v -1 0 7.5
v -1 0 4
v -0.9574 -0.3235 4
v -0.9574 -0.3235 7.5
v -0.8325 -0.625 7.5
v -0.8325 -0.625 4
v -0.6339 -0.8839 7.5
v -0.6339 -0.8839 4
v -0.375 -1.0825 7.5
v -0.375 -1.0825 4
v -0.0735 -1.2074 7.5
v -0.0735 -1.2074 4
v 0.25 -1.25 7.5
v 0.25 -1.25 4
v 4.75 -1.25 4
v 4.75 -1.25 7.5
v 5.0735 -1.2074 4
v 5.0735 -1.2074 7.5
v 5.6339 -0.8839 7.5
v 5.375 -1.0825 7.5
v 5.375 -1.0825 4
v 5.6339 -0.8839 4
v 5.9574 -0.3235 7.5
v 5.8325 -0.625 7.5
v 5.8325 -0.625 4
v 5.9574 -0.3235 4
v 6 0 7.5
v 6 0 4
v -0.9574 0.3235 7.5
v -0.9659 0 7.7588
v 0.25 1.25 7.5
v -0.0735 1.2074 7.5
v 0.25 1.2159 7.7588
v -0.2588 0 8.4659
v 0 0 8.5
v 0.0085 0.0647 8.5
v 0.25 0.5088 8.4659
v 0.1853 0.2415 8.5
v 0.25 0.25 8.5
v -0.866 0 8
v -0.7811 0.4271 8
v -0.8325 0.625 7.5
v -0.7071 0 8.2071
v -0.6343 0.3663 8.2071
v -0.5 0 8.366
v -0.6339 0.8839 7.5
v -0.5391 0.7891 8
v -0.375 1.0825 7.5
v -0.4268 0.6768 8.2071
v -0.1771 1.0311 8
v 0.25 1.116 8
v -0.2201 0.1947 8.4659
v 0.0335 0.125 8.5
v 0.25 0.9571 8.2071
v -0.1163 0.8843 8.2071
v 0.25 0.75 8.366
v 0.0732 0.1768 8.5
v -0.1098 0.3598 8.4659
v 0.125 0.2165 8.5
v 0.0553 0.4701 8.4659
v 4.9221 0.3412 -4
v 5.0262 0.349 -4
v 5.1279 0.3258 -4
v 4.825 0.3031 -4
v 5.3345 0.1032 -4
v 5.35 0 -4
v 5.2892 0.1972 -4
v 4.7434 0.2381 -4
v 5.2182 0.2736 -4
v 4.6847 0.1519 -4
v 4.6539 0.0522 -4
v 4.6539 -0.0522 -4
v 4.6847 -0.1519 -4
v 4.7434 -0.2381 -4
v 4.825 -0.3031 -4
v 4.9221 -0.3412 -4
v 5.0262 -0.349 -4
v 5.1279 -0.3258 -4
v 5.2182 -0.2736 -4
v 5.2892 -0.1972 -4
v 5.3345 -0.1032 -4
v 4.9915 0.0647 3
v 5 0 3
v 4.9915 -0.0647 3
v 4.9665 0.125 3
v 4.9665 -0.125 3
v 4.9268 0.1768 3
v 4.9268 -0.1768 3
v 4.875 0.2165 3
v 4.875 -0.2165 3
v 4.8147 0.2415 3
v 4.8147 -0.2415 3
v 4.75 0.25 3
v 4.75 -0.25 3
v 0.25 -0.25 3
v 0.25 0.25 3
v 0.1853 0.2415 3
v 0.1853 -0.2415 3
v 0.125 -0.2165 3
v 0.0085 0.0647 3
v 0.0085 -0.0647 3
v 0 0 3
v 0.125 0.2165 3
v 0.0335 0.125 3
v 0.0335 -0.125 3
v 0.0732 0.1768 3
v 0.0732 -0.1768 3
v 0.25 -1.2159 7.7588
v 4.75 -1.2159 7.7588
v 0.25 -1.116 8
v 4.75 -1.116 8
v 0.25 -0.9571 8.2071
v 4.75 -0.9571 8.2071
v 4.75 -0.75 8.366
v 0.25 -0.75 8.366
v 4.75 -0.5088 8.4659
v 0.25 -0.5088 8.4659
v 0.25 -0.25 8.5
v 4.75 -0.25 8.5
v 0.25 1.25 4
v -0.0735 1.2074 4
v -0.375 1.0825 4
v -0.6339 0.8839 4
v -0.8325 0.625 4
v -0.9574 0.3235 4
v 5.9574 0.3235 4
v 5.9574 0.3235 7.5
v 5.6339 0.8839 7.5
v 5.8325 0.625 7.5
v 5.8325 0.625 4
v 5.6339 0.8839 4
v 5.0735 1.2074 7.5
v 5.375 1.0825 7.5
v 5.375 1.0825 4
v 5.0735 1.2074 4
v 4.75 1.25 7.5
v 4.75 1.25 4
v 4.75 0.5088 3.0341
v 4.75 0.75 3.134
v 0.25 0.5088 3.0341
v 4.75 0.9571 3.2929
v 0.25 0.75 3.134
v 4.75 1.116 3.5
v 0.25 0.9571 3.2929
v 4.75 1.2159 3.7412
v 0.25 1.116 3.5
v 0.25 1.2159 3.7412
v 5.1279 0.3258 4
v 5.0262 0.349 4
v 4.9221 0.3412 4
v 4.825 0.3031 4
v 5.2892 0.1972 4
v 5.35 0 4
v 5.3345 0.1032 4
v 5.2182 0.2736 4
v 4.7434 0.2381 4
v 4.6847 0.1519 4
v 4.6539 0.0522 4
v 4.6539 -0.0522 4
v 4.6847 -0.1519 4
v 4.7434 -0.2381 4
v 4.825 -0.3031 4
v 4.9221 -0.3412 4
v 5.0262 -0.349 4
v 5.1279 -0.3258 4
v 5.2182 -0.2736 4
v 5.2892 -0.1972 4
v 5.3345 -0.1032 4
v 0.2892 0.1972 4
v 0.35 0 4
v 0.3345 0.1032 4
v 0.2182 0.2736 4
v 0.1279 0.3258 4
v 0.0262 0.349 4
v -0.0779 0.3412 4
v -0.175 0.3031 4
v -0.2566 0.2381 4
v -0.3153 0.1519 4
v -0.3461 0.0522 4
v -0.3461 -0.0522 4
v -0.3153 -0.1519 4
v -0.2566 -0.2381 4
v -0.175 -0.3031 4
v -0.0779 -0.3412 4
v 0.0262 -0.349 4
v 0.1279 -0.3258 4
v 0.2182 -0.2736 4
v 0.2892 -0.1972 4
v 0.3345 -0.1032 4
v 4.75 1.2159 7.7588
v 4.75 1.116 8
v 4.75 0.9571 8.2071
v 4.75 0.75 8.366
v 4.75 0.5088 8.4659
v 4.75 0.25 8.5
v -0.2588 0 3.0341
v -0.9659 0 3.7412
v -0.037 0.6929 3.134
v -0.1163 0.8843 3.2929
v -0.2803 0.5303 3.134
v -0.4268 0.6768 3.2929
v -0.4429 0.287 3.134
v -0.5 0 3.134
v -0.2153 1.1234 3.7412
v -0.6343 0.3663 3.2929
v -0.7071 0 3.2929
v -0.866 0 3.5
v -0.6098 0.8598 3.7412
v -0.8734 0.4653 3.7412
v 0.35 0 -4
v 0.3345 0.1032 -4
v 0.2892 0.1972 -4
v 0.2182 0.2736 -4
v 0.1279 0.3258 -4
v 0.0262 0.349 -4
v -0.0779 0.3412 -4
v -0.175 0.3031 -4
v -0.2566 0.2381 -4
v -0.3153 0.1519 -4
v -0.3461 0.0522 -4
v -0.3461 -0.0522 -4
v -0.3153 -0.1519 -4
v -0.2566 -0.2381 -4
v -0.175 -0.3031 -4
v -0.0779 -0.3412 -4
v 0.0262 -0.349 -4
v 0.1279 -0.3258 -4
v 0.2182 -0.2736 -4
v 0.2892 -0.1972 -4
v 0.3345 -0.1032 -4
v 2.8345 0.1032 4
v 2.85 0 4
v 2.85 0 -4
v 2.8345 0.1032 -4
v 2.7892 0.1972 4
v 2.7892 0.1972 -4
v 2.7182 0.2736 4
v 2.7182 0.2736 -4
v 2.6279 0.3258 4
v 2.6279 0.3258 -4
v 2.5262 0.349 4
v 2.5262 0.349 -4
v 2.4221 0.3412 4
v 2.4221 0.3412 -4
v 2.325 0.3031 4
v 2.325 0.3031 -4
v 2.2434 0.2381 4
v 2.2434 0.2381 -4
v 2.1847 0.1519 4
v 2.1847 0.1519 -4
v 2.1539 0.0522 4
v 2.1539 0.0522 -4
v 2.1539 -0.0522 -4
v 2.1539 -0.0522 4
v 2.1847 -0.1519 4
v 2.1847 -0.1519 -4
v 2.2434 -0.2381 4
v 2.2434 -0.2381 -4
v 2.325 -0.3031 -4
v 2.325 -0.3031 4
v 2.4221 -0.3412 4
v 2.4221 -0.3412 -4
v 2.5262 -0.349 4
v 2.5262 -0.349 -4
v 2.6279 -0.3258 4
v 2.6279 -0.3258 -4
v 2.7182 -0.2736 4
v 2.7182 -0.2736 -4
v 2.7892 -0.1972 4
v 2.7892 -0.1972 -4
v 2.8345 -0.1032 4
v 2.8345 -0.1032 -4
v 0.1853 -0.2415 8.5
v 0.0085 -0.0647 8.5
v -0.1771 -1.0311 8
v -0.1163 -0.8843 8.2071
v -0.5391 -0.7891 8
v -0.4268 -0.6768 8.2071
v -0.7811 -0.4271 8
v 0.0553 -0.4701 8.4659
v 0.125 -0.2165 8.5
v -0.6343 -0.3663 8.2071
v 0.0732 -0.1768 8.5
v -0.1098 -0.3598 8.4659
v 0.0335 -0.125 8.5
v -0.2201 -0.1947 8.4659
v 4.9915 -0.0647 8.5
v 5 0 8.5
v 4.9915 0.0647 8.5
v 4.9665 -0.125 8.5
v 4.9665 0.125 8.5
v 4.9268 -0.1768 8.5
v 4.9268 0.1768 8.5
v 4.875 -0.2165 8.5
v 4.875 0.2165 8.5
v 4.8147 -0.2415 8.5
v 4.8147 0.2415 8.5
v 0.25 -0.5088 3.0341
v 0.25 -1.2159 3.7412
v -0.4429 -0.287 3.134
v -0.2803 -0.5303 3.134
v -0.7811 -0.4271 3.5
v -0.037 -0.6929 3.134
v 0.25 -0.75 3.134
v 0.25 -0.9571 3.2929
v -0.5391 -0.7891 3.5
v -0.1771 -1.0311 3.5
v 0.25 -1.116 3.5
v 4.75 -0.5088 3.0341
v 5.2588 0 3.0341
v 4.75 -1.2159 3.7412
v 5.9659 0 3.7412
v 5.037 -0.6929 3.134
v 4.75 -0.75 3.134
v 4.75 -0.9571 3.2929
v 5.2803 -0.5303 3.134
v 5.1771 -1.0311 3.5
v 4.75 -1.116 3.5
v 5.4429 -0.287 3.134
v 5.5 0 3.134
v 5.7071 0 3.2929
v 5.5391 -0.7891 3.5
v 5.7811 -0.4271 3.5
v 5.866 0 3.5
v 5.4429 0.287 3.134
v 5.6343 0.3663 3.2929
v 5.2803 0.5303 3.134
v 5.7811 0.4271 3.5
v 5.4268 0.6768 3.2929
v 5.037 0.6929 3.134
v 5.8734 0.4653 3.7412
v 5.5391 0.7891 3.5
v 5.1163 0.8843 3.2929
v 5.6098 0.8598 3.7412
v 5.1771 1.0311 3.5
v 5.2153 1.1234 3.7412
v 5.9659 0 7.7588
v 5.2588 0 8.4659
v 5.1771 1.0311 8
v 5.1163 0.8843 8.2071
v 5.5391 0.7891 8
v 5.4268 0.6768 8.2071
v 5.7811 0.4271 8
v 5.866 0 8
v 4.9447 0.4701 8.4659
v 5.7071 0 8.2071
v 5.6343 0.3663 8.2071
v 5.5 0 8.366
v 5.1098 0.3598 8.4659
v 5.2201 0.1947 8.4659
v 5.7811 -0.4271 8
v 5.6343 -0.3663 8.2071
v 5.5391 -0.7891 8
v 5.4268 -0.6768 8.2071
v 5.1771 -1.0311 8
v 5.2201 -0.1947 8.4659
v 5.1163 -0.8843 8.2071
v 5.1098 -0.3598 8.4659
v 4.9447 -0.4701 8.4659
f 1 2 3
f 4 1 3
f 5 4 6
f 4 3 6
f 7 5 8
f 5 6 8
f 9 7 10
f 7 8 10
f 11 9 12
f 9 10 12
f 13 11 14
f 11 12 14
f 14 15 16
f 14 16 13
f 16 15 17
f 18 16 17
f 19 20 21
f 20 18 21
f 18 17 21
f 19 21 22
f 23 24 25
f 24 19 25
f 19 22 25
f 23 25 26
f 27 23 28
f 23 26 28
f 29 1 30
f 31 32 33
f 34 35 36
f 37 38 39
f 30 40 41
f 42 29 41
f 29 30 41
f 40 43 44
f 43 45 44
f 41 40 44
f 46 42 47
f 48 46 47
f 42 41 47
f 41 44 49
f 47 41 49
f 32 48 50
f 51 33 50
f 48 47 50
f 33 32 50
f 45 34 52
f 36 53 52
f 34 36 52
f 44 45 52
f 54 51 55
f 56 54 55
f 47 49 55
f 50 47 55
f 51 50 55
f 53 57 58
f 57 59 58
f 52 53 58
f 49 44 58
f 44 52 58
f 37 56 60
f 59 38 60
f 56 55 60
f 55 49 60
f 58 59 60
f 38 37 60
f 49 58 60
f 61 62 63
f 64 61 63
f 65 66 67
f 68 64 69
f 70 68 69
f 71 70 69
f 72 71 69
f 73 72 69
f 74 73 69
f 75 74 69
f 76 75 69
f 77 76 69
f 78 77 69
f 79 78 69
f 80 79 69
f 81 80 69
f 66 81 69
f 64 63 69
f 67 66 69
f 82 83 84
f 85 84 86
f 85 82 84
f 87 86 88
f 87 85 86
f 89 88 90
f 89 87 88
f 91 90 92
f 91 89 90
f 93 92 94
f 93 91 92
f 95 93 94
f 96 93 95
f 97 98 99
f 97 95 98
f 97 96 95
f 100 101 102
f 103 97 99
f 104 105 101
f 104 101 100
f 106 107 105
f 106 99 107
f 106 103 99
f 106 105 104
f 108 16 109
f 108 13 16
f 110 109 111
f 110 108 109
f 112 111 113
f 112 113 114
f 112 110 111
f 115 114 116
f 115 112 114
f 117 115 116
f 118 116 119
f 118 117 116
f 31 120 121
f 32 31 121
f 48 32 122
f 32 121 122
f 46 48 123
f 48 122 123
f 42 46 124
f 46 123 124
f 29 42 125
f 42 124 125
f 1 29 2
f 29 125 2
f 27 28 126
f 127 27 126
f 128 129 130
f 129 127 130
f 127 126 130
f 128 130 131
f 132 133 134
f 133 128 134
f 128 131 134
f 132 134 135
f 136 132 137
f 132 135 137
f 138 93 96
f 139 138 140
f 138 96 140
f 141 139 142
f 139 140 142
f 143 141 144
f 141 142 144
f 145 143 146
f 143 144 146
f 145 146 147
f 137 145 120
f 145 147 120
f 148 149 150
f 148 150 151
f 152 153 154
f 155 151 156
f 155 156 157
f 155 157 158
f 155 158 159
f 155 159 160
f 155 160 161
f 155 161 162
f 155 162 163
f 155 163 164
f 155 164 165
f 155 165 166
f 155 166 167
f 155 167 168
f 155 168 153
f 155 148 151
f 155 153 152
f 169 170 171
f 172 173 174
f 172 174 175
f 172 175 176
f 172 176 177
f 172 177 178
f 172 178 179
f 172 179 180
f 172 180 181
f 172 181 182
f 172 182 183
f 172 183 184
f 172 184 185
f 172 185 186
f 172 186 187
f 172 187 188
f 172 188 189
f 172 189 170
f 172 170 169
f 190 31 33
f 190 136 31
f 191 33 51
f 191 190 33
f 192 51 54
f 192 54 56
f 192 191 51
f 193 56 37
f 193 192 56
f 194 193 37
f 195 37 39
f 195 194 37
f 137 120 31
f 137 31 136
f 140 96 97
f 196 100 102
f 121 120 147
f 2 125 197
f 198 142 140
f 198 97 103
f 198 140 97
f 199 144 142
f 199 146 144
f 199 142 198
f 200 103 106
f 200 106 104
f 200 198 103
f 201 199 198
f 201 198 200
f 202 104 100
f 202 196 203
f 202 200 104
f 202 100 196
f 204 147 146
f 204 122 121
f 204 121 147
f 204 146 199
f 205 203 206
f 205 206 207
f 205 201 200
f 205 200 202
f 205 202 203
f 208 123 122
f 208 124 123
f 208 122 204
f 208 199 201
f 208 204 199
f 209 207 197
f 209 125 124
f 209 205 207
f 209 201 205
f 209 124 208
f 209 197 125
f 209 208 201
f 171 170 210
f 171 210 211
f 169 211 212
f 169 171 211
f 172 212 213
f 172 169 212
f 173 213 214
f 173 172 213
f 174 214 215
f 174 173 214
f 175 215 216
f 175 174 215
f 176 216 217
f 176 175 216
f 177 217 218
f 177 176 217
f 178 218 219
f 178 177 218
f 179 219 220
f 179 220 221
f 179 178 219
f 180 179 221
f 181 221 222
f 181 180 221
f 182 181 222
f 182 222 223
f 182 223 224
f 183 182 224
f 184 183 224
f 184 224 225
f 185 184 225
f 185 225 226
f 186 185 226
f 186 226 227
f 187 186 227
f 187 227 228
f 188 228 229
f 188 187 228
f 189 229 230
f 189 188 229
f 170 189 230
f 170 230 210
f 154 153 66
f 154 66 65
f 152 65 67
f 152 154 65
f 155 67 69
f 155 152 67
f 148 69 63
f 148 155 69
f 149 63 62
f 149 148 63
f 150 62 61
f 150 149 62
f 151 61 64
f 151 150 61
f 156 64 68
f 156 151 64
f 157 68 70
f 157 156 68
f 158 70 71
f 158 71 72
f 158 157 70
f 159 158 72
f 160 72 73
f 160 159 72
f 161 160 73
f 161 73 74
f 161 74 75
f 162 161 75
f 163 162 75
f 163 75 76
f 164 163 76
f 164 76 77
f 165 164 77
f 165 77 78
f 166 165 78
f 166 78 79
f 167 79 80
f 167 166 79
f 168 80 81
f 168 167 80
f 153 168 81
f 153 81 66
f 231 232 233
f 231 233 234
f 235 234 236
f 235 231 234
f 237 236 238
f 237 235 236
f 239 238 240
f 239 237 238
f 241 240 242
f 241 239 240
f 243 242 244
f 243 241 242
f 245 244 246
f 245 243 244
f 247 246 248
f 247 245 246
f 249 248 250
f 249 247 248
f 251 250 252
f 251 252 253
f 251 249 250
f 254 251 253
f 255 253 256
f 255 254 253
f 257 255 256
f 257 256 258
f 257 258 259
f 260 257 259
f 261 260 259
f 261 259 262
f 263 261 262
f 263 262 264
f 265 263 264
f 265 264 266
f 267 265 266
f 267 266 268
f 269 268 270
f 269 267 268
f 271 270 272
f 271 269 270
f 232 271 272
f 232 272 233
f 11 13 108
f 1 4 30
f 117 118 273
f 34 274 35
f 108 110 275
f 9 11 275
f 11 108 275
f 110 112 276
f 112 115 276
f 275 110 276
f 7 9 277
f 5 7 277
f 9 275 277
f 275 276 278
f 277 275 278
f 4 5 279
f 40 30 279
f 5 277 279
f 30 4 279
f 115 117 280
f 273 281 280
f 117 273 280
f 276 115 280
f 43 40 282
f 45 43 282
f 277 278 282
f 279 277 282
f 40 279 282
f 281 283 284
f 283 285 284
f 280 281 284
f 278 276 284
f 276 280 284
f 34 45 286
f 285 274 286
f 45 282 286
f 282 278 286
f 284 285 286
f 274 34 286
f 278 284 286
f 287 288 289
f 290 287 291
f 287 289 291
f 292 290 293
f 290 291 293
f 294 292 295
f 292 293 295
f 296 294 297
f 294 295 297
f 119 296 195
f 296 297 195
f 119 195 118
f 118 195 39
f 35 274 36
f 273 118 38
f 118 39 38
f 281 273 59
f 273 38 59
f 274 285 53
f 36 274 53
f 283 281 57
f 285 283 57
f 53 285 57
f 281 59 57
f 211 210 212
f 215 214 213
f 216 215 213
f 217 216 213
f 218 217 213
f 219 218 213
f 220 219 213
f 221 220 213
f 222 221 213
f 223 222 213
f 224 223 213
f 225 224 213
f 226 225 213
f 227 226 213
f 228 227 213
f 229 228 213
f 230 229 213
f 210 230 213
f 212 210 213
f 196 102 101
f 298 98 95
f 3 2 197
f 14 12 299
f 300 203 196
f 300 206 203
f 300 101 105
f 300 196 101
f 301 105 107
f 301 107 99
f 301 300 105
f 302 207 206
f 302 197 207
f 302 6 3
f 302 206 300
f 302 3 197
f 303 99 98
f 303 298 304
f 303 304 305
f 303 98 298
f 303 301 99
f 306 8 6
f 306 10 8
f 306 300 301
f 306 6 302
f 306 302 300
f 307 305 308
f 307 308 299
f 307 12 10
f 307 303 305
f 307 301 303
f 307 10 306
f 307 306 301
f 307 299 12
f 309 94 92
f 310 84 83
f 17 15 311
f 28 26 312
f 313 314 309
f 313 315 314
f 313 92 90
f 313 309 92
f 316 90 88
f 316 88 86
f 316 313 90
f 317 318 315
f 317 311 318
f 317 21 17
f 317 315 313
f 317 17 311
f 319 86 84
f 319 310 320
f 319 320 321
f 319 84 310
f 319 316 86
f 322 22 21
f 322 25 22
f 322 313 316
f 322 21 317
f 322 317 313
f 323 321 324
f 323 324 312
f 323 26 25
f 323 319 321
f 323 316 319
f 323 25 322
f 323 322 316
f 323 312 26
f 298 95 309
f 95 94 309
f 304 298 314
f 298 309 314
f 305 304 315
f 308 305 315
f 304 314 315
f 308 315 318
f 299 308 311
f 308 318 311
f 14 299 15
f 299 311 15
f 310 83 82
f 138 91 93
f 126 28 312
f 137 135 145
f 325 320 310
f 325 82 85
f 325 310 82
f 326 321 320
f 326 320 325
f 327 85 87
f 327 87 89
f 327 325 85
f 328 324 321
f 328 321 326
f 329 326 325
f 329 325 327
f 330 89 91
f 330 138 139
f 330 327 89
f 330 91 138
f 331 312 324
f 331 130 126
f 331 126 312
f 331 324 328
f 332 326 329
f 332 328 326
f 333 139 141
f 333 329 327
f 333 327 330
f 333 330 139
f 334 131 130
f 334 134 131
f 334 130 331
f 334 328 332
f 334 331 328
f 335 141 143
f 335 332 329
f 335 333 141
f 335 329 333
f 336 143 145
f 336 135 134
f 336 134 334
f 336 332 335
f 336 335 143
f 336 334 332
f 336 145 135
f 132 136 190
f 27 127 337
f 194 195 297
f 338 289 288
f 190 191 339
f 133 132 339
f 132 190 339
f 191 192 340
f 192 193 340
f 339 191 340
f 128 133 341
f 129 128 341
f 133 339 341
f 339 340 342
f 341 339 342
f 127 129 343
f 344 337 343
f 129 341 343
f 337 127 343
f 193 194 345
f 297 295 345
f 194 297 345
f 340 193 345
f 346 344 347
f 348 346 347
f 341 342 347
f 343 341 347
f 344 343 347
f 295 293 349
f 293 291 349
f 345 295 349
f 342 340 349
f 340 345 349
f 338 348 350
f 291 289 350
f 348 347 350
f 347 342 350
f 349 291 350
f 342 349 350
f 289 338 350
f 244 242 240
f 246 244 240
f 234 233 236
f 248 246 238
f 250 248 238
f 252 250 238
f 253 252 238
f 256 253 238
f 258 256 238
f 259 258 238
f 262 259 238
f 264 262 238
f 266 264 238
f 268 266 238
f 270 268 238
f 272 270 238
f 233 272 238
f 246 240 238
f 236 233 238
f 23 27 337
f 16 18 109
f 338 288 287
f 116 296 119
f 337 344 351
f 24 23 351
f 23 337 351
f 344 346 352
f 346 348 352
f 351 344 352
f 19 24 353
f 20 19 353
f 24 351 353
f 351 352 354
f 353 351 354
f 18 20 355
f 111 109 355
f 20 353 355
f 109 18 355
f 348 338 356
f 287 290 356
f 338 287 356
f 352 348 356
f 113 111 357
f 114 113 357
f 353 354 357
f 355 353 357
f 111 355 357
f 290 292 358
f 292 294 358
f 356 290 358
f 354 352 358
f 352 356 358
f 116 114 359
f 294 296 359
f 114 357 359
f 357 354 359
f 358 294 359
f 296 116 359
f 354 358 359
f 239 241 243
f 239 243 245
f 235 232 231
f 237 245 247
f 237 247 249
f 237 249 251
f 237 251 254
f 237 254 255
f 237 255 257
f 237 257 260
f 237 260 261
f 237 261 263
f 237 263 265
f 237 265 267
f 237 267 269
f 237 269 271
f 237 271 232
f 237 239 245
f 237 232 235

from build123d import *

# Parameters (mm, degrees)
SKETCH_R     = 0.35
PAD_DEPTH    = 8
PAD002_DEPTH = 5.5
FILLET_R     = 1
FILLET001_R  = 1


with BuildPart() as pad:
    # Sketch → Pad (new body)
    with BuildSketch(Plane.XY.offset(4)):
        Circle(SKETCH_R)
        with Locations((5, 0)):
            Circle(SKETCH_R)
        with Locations((2.5, 0)):
            Circle(SKETCH_R)
    extrude(amount=-PAD_DEPTH)


with BuildPart() as fillet001:
    # Sketch003 → Pad002 (new body)
    with BuildSketch(Plane.XY.offset(3)):
        with BuildLine():
            Line((0.25, 1.25), (4.75, 1.25))
            ThreePointArc((6, 0), (5.633883, 0.883883), (4.75, 1.25))
            ThreePointArc((4.75, -1.25), (5.633883, -0.883883), (6, 0))
            Line((4.75, -1.25), (0.25, -1.25))
            ThreePointArc((-1, 0), (-0.633883, -0.883883), (0.25, -1.25))
            ThreePointArc((0.25, 1.25), (-0.633883, 0.883883), (-1, 0))
        make_face()
    extrude(amount=PAD002_DEPTH)

    # Fillet
    fillet_edges = [fillet001.edges().sort_by_distance(p)[0] for p in [
        (2.5, 1.25, 8.5),
        (-0.633883, 0.883883, 8.5),
        (-0.633883, -0.883883, 8.5),
        (2.5, -1.25, 8.5),
        (5.633883, -0.883883, 8.5),
        (5.633883, 0.883883, 8.5),
    ]]
    fillet(fillet_edges, radius=FILLET_R)

    # Fillet001
    fillet001_edges = [fillet001.edges().sort_by_distance(p)[0] for p in [
        (5.633883, -0.883883, 3),
        (5.633883, 0.883883, 3),
        (2.5, 1.25, 3),
        (2.5, -1.25, 3),
        (-0.633883, -0.883883, 3),
        (-0.633883, 0.883883, 3),
    ]]
    fillet(fillet001_edges, radius=FILLET001_R)


solid = Compound([pad.part, fillet001.part])
